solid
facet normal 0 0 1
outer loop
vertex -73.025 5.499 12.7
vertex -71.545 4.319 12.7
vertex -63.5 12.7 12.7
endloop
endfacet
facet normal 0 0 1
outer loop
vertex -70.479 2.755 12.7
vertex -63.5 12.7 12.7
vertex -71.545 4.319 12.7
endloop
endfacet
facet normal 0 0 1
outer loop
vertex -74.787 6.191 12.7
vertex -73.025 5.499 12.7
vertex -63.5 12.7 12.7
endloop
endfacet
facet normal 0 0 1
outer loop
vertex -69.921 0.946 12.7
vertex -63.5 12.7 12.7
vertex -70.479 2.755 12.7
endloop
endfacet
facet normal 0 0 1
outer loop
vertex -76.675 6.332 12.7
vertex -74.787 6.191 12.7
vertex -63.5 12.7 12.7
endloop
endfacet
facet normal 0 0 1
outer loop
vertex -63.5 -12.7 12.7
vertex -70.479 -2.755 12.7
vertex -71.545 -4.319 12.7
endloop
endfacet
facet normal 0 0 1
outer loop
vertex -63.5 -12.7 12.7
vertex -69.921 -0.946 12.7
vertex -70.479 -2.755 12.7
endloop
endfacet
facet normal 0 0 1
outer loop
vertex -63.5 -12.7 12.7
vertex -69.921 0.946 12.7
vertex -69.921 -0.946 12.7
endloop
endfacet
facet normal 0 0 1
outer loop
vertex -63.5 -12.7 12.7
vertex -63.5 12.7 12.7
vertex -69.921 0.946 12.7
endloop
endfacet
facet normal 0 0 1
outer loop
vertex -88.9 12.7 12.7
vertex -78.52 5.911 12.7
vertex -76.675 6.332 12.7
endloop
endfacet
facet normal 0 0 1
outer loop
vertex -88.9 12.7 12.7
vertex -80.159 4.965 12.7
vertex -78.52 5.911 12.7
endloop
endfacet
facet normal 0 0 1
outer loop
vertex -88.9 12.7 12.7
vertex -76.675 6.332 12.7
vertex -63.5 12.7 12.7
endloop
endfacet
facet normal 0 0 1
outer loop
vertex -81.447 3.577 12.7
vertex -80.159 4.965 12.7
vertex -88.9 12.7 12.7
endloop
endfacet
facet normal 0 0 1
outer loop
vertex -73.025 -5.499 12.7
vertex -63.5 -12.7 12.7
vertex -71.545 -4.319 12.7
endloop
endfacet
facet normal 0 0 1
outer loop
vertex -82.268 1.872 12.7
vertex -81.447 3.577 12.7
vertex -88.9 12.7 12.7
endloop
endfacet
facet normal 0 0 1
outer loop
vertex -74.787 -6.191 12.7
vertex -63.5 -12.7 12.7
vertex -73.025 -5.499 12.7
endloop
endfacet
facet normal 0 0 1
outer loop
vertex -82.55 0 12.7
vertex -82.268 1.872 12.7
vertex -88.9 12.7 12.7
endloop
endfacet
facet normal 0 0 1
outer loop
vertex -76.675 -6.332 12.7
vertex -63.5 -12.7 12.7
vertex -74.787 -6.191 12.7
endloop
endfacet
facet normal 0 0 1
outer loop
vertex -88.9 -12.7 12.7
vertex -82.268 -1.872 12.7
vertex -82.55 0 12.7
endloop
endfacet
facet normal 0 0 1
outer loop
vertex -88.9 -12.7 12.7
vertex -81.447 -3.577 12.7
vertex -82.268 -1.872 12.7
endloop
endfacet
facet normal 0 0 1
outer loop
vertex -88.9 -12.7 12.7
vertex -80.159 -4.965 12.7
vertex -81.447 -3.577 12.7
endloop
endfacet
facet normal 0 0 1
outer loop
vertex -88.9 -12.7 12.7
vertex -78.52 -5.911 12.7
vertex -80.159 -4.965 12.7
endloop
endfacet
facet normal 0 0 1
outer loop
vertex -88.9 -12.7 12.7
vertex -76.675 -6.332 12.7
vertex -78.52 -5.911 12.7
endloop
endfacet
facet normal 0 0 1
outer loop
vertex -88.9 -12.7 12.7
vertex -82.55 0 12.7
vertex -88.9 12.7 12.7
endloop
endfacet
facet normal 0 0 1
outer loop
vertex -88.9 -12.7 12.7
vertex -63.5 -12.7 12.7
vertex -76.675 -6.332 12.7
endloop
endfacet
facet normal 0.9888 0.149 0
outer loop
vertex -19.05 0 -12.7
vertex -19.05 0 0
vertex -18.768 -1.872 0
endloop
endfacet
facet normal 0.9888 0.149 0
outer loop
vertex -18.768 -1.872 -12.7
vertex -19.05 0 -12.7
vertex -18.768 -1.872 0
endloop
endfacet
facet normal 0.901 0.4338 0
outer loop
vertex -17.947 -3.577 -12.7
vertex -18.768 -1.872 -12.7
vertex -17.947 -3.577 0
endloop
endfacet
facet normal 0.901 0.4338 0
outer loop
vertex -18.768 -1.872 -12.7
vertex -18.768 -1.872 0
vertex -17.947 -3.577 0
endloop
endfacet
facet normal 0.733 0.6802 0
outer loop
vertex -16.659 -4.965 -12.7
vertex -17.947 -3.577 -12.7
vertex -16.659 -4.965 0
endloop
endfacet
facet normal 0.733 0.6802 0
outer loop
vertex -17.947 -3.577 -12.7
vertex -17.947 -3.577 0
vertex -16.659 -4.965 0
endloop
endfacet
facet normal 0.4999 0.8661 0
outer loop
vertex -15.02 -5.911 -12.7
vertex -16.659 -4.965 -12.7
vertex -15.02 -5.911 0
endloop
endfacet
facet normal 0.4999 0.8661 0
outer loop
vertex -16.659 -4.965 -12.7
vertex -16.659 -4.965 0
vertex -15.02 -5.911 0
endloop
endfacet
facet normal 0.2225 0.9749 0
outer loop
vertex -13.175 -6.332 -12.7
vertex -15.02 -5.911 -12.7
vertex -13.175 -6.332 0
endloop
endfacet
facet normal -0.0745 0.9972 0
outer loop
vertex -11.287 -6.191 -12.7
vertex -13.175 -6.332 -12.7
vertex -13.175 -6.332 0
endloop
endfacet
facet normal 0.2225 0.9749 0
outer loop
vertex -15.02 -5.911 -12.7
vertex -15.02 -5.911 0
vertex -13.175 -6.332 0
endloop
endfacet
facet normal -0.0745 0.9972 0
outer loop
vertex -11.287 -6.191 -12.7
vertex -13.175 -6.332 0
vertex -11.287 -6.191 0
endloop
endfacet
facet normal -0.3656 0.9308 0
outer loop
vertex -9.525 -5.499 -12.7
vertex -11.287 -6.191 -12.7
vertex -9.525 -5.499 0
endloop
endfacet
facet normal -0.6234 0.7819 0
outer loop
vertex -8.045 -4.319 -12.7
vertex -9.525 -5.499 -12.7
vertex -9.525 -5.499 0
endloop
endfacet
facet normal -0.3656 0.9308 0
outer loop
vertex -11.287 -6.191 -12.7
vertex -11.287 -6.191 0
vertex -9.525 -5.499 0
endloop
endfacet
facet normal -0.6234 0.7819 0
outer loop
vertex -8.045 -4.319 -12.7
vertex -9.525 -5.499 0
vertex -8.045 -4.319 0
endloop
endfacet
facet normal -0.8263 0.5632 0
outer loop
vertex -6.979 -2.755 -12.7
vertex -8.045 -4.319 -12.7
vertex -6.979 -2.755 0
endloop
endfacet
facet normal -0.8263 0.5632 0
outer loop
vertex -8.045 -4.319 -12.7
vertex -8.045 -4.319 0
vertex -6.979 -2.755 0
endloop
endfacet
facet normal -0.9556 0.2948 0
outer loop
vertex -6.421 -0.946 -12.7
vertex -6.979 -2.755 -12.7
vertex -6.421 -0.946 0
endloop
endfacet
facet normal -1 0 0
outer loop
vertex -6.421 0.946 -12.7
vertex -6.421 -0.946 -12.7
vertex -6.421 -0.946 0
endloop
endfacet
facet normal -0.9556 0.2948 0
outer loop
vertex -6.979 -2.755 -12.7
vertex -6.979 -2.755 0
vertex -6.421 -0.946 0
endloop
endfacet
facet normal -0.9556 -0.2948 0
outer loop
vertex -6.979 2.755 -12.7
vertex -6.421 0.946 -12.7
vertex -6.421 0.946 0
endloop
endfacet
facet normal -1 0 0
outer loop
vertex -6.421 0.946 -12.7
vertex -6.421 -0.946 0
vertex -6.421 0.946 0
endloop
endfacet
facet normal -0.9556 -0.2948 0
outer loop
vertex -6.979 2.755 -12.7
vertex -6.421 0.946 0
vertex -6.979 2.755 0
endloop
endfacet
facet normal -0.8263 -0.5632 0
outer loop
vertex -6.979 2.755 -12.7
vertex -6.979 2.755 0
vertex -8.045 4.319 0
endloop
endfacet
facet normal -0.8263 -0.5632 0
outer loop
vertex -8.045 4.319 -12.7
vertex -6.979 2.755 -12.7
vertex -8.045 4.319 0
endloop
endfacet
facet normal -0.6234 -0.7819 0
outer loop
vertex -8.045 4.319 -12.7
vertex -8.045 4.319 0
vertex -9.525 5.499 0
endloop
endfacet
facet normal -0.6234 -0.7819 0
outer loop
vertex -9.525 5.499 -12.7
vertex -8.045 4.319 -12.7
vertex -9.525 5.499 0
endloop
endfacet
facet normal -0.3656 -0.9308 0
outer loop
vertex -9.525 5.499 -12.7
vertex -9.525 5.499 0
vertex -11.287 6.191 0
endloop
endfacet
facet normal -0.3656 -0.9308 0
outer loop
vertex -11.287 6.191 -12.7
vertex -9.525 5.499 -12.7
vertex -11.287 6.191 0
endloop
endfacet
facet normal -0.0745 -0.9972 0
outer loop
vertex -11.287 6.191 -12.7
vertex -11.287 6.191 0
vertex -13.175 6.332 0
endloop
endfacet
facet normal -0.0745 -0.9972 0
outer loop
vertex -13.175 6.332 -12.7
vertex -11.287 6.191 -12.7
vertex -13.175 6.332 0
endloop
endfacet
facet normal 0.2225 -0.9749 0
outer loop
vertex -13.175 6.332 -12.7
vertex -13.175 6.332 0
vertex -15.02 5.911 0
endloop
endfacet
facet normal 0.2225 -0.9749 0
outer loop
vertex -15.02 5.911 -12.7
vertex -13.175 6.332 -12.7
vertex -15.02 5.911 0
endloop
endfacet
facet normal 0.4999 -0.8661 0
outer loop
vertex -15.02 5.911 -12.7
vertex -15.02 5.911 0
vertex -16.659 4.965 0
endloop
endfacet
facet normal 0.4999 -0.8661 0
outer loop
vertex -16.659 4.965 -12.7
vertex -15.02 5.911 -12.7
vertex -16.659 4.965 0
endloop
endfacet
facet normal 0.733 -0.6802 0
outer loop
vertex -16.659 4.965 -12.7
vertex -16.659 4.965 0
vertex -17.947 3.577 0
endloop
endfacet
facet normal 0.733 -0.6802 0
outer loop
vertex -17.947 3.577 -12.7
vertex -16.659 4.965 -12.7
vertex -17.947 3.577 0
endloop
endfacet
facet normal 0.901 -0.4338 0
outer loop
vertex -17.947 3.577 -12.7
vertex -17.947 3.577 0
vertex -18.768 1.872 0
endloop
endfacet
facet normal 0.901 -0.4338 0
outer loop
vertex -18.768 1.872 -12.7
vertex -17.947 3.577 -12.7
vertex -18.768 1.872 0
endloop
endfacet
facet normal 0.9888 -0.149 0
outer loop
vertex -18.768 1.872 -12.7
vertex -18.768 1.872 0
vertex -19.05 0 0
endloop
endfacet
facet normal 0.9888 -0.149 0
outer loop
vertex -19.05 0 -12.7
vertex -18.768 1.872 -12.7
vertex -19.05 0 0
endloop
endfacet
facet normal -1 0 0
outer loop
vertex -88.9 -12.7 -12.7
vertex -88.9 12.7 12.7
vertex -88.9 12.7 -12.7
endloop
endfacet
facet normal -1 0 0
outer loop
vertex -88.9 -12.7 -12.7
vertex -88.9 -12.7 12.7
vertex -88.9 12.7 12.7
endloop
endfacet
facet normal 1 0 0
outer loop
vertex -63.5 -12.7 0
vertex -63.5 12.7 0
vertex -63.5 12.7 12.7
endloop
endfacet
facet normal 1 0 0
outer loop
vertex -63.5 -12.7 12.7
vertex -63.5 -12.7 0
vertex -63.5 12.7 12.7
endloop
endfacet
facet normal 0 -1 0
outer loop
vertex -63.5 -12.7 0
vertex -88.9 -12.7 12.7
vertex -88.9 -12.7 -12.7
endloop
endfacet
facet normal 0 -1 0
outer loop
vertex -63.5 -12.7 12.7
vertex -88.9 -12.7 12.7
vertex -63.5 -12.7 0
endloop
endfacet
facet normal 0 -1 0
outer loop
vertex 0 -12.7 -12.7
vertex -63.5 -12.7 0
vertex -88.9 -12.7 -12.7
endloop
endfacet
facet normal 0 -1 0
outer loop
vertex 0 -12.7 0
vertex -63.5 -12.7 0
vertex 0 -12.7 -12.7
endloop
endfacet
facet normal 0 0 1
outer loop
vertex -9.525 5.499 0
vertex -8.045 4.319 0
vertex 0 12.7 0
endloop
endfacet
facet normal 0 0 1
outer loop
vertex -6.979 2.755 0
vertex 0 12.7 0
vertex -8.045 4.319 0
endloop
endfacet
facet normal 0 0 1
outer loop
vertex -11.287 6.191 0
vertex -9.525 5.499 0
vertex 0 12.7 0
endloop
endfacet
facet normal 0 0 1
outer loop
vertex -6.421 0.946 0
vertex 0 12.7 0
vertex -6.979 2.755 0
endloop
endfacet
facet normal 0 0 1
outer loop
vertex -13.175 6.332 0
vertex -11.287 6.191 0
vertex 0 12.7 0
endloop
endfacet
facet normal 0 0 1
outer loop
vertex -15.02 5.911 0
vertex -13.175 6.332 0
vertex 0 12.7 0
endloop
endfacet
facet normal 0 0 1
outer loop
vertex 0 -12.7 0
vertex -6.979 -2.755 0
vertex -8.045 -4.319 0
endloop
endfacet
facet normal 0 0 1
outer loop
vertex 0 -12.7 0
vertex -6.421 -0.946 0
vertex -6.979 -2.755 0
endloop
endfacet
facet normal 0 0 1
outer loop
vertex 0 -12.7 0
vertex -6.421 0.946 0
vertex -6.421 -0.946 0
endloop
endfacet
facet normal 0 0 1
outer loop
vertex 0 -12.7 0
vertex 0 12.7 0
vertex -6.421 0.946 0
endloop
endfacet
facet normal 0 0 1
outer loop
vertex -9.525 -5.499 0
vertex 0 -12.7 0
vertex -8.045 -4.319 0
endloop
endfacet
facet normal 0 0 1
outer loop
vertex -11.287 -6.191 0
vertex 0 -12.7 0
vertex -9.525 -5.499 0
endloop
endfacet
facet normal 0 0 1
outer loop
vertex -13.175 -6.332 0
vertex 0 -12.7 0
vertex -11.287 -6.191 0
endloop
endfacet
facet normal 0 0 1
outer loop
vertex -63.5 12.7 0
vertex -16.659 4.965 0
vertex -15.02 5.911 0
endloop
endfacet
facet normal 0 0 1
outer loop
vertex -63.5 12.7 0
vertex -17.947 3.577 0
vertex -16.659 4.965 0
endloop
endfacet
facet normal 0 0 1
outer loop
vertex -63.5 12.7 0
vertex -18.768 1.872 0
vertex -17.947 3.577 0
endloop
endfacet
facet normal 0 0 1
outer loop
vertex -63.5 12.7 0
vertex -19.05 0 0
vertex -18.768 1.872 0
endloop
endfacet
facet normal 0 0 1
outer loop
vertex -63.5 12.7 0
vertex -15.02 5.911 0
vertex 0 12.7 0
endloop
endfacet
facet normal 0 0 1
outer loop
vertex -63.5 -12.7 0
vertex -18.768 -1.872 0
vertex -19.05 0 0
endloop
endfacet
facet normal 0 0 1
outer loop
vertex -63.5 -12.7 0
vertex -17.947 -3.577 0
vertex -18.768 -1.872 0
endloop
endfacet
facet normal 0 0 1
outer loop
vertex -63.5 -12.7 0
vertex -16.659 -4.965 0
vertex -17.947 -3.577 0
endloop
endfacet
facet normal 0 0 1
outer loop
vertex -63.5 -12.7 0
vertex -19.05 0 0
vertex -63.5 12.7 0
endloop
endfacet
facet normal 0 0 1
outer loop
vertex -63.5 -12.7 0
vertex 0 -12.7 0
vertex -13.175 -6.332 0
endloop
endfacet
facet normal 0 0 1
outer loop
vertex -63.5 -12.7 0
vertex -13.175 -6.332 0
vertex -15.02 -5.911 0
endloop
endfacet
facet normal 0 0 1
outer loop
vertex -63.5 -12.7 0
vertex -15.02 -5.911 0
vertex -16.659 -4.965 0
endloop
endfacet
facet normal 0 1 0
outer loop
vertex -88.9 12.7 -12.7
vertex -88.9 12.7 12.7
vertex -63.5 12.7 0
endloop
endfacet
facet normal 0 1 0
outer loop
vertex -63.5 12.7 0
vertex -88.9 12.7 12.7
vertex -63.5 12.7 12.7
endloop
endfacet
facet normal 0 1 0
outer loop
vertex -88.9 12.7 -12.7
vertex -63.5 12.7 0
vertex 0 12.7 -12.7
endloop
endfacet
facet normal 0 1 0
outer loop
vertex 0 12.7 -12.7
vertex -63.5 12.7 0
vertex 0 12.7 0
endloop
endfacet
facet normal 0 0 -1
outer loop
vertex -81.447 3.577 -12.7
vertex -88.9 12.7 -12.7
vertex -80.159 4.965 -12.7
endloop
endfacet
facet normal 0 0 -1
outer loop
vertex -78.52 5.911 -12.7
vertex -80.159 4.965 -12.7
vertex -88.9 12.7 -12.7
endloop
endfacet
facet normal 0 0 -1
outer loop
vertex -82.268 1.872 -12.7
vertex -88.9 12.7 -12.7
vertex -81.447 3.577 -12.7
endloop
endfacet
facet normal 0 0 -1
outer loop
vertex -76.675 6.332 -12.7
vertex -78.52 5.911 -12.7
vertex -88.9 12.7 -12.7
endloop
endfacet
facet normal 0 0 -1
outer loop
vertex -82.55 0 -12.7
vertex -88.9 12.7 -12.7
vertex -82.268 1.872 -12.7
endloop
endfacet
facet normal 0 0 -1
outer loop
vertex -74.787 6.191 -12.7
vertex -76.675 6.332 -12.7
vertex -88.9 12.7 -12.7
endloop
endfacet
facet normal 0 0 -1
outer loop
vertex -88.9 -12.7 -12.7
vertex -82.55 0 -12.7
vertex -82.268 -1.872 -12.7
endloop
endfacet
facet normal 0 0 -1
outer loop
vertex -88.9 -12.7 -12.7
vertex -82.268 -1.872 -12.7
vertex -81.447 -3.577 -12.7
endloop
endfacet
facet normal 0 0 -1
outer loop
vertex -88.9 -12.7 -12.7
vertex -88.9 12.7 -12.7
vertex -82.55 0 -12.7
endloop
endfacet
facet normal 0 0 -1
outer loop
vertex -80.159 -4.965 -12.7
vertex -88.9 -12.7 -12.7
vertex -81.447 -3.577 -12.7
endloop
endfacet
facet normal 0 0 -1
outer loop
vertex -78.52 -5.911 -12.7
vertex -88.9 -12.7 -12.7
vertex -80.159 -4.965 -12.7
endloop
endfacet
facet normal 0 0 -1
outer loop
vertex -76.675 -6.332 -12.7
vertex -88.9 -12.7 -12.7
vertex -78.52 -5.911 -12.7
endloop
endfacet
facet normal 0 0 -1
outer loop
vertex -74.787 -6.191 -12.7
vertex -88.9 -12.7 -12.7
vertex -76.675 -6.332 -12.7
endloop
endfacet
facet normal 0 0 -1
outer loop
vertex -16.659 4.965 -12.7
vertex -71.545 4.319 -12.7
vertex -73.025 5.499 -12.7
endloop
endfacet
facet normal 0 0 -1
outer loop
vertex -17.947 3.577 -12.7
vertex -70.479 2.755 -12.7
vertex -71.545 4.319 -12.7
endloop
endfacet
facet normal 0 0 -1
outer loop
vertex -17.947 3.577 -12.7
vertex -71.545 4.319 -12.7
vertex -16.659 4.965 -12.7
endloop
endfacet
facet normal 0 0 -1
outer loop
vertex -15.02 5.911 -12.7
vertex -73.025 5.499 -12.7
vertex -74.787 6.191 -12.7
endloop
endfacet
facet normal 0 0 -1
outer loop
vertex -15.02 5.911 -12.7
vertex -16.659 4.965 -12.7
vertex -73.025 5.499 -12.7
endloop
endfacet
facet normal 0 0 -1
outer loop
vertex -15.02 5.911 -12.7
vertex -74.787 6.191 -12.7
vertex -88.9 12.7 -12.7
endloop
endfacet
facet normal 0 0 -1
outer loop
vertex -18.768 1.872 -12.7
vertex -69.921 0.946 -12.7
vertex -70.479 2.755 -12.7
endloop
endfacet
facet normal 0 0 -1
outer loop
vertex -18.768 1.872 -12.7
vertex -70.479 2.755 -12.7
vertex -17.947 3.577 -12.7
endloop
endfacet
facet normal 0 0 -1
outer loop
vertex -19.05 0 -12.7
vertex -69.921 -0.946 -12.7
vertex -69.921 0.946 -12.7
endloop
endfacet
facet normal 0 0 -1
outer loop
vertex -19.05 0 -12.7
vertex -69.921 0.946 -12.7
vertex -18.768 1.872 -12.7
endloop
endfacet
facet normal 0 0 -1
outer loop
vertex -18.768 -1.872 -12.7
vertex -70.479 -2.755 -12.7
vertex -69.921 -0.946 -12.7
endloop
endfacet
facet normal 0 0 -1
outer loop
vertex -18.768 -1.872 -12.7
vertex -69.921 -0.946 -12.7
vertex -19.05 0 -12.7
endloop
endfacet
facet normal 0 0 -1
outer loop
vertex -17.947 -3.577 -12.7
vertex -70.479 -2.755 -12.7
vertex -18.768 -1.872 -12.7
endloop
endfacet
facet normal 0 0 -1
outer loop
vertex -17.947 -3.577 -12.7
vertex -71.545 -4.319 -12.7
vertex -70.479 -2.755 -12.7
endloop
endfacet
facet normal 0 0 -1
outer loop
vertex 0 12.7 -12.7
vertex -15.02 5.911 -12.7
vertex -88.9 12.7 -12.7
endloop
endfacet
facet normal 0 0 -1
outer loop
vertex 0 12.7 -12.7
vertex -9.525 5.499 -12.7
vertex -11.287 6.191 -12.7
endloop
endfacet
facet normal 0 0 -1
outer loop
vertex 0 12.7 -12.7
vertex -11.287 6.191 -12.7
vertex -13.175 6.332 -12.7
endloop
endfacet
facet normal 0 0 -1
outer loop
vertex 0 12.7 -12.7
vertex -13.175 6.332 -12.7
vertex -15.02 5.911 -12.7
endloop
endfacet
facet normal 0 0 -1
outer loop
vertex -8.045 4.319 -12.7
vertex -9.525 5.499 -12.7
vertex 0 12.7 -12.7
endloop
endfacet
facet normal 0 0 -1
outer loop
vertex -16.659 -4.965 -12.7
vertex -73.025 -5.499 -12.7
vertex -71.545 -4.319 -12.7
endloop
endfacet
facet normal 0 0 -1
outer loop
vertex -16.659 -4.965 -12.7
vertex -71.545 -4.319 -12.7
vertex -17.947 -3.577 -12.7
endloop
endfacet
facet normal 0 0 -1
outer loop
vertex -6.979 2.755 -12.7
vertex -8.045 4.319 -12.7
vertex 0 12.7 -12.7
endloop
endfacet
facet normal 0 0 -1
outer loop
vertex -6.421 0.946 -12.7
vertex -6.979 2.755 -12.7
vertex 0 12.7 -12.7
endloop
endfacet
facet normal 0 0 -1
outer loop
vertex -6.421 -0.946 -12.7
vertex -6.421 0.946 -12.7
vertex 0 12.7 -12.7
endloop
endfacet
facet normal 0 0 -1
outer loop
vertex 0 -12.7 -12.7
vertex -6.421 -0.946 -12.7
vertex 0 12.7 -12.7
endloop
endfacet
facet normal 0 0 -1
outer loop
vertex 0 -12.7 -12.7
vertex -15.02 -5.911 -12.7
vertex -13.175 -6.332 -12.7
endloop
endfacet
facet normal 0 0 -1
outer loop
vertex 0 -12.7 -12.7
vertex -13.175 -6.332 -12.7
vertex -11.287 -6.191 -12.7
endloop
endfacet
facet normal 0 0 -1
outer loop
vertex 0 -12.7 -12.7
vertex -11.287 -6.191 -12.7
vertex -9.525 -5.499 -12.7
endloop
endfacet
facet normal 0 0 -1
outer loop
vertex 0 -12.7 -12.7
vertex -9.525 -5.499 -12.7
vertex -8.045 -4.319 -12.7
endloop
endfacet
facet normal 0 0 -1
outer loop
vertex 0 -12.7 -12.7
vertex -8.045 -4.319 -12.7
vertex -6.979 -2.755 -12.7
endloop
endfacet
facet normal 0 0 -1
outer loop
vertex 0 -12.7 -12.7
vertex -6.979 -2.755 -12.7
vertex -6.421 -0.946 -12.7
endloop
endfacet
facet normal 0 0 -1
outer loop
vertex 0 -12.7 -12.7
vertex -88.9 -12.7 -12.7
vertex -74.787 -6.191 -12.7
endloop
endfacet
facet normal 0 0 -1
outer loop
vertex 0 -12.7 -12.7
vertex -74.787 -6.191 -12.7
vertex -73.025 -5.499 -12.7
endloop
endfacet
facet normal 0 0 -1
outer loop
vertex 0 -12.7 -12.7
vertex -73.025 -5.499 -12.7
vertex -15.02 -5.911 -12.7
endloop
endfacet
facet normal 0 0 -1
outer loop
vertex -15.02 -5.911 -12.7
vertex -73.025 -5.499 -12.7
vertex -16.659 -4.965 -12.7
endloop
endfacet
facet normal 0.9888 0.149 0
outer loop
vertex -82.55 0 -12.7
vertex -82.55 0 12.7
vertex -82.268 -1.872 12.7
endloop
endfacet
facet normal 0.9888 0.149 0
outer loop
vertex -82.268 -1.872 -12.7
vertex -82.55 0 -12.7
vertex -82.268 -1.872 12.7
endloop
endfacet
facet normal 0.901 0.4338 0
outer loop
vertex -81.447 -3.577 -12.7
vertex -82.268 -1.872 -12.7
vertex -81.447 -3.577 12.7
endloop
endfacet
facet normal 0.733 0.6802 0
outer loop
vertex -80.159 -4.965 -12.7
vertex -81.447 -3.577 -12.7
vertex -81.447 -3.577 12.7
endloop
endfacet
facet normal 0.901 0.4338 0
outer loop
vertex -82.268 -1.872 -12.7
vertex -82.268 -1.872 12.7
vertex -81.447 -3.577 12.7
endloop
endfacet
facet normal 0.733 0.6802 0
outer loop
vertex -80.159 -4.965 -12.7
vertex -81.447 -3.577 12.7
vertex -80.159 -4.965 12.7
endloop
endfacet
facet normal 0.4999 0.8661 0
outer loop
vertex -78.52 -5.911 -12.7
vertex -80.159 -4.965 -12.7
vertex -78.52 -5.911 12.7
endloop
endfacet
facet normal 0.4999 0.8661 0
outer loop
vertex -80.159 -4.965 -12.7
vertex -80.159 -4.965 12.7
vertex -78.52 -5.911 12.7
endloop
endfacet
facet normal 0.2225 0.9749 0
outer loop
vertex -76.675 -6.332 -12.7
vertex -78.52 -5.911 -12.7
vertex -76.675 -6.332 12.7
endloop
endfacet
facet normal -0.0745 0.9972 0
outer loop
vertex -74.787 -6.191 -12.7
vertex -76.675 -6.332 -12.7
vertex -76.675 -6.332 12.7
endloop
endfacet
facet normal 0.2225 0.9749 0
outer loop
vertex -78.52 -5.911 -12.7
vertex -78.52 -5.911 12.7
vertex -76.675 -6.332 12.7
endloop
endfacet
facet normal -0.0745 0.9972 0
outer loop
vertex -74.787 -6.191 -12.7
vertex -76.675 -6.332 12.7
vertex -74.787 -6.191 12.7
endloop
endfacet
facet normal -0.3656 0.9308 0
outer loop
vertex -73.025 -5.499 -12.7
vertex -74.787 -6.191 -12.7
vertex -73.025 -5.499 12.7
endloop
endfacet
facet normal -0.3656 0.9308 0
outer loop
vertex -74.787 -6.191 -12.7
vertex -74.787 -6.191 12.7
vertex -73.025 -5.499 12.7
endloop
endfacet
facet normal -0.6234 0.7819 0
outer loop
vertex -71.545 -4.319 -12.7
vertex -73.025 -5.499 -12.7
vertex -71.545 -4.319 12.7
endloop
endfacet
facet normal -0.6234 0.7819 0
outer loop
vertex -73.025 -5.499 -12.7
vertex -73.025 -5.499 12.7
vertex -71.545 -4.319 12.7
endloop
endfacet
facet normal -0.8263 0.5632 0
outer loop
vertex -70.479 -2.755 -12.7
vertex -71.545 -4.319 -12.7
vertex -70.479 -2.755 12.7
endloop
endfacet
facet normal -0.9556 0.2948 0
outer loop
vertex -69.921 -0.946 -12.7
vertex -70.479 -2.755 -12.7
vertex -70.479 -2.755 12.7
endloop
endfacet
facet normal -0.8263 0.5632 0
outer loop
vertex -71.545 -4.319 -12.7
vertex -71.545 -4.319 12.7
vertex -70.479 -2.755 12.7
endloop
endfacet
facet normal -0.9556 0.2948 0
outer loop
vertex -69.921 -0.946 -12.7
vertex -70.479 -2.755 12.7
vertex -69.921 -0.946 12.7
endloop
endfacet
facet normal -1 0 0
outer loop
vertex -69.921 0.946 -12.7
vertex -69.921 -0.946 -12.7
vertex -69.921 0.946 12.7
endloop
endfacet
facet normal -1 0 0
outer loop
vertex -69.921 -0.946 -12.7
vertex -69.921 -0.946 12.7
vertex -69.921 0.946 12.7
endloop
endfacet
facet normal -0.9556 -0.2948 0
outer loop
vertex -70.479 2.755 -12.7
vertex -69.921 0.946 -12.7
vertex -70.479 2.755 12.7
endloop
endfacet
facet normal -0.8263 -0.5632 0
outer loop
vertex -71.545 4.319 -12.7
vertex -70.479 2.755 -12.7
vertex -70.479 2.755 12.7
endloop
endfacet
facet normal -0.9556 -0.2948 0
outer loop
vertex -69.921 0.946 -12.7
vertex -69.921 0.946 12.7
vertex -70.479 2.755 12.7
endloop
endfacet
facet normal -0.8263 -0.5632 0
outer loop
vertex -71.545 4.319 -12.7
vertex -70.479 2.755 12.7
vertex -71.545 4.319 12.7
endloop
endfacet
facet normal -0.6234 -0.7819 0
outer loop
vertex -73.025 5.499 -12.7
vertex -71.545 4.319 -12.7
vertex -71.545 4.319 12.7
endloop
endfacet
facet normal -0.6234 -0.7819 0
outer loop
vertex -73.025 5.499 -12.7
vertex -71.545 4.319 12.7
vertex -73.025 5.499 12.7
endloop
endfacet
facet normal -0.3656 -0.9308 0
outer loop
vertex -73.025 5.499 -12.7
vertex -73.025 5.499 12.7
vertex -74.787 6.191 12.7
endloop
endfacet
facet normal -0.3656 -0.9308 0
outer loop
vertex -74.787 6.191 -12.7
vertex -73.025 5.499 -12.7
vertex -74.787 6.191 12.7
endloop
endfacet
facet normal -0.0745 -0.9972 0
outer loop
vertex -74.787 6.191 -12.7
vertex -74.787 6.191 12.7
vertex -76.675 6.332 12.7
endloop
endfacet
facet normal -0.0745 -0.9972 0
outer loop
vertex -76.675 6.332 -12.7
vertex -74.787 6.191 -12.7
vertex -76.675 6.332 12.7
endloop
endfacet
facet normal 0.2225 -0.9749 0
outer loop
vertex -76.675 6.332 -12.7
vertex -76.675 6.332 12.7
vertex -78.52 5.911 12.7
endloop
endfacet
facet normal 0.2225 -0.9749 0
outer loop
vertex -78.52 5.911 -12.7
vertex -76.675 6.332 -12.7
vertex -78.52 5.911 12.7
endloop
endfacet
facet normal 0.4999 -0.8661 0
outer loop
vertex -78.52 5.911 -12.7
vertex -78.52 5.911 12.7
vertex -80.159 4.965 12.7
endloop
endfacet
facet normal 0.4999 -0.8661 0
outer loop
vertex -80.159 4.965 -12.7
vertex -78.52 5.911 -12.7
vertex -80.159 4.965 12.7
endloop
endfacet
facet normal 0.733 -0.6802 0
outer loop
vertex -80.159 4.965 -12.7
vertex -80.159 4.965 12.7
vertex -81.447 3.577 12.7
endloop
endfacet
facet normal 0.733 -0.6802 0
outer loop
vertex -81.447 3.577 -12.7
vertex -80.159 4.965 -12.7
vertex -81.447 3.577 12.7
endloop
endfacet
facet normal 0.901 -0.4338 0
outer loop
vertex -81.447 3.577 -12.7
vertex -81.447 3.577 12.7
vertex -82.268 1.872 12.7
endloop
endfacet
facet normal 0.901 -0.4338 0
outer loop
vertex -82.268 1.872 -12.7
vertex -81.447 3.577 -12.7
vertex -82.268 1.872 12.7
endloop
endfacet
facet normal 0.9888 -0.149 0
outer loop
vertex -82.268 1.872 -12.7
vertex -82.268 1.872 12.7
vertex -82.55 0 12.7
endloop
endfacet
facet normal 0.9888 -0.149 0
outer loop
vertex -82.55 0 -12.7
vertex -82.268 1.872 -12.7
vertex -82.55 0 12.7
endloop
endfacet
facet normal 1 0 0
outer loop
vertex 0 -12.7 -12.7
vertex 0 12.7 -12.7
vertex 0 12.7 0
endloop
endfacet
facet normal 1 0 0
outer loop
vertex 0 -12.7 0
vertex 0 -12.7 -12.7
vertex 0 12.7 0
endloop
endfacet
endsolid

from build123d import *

# Parameters (mm, degrees)
F1_DEPTH = 12.7
F3_D     = 12.7


# Not quite as in the source:
# - a length typed as a fraction of an inch, garbled in the dataset ("3 / 203.2 mm" for 3/8 in), is restored


with BuildPart() as f1:
    # F0 (on Front) → F1 (new body, symmetric)
    with BuildSketch(Plane.XZ):
        Polygon((0, -12.7), (0, 0), (-63.5, 0), (-63.5, 12.7), (-88.9, 12.7), (-88.9, -12.7), align=None)
    extrude(amount=F1_DEPTH, both=True)

    # F3 (through all)
    with Locations(Plane(origin=(0, 0, -12.7), x_dir=(1, 0, 0), z_dir=(0, 0, -1))):
        with Locations((-76.2, 0), (-12.7, 0)):
            Hole(F3_D / 2)


solid = f1.part
